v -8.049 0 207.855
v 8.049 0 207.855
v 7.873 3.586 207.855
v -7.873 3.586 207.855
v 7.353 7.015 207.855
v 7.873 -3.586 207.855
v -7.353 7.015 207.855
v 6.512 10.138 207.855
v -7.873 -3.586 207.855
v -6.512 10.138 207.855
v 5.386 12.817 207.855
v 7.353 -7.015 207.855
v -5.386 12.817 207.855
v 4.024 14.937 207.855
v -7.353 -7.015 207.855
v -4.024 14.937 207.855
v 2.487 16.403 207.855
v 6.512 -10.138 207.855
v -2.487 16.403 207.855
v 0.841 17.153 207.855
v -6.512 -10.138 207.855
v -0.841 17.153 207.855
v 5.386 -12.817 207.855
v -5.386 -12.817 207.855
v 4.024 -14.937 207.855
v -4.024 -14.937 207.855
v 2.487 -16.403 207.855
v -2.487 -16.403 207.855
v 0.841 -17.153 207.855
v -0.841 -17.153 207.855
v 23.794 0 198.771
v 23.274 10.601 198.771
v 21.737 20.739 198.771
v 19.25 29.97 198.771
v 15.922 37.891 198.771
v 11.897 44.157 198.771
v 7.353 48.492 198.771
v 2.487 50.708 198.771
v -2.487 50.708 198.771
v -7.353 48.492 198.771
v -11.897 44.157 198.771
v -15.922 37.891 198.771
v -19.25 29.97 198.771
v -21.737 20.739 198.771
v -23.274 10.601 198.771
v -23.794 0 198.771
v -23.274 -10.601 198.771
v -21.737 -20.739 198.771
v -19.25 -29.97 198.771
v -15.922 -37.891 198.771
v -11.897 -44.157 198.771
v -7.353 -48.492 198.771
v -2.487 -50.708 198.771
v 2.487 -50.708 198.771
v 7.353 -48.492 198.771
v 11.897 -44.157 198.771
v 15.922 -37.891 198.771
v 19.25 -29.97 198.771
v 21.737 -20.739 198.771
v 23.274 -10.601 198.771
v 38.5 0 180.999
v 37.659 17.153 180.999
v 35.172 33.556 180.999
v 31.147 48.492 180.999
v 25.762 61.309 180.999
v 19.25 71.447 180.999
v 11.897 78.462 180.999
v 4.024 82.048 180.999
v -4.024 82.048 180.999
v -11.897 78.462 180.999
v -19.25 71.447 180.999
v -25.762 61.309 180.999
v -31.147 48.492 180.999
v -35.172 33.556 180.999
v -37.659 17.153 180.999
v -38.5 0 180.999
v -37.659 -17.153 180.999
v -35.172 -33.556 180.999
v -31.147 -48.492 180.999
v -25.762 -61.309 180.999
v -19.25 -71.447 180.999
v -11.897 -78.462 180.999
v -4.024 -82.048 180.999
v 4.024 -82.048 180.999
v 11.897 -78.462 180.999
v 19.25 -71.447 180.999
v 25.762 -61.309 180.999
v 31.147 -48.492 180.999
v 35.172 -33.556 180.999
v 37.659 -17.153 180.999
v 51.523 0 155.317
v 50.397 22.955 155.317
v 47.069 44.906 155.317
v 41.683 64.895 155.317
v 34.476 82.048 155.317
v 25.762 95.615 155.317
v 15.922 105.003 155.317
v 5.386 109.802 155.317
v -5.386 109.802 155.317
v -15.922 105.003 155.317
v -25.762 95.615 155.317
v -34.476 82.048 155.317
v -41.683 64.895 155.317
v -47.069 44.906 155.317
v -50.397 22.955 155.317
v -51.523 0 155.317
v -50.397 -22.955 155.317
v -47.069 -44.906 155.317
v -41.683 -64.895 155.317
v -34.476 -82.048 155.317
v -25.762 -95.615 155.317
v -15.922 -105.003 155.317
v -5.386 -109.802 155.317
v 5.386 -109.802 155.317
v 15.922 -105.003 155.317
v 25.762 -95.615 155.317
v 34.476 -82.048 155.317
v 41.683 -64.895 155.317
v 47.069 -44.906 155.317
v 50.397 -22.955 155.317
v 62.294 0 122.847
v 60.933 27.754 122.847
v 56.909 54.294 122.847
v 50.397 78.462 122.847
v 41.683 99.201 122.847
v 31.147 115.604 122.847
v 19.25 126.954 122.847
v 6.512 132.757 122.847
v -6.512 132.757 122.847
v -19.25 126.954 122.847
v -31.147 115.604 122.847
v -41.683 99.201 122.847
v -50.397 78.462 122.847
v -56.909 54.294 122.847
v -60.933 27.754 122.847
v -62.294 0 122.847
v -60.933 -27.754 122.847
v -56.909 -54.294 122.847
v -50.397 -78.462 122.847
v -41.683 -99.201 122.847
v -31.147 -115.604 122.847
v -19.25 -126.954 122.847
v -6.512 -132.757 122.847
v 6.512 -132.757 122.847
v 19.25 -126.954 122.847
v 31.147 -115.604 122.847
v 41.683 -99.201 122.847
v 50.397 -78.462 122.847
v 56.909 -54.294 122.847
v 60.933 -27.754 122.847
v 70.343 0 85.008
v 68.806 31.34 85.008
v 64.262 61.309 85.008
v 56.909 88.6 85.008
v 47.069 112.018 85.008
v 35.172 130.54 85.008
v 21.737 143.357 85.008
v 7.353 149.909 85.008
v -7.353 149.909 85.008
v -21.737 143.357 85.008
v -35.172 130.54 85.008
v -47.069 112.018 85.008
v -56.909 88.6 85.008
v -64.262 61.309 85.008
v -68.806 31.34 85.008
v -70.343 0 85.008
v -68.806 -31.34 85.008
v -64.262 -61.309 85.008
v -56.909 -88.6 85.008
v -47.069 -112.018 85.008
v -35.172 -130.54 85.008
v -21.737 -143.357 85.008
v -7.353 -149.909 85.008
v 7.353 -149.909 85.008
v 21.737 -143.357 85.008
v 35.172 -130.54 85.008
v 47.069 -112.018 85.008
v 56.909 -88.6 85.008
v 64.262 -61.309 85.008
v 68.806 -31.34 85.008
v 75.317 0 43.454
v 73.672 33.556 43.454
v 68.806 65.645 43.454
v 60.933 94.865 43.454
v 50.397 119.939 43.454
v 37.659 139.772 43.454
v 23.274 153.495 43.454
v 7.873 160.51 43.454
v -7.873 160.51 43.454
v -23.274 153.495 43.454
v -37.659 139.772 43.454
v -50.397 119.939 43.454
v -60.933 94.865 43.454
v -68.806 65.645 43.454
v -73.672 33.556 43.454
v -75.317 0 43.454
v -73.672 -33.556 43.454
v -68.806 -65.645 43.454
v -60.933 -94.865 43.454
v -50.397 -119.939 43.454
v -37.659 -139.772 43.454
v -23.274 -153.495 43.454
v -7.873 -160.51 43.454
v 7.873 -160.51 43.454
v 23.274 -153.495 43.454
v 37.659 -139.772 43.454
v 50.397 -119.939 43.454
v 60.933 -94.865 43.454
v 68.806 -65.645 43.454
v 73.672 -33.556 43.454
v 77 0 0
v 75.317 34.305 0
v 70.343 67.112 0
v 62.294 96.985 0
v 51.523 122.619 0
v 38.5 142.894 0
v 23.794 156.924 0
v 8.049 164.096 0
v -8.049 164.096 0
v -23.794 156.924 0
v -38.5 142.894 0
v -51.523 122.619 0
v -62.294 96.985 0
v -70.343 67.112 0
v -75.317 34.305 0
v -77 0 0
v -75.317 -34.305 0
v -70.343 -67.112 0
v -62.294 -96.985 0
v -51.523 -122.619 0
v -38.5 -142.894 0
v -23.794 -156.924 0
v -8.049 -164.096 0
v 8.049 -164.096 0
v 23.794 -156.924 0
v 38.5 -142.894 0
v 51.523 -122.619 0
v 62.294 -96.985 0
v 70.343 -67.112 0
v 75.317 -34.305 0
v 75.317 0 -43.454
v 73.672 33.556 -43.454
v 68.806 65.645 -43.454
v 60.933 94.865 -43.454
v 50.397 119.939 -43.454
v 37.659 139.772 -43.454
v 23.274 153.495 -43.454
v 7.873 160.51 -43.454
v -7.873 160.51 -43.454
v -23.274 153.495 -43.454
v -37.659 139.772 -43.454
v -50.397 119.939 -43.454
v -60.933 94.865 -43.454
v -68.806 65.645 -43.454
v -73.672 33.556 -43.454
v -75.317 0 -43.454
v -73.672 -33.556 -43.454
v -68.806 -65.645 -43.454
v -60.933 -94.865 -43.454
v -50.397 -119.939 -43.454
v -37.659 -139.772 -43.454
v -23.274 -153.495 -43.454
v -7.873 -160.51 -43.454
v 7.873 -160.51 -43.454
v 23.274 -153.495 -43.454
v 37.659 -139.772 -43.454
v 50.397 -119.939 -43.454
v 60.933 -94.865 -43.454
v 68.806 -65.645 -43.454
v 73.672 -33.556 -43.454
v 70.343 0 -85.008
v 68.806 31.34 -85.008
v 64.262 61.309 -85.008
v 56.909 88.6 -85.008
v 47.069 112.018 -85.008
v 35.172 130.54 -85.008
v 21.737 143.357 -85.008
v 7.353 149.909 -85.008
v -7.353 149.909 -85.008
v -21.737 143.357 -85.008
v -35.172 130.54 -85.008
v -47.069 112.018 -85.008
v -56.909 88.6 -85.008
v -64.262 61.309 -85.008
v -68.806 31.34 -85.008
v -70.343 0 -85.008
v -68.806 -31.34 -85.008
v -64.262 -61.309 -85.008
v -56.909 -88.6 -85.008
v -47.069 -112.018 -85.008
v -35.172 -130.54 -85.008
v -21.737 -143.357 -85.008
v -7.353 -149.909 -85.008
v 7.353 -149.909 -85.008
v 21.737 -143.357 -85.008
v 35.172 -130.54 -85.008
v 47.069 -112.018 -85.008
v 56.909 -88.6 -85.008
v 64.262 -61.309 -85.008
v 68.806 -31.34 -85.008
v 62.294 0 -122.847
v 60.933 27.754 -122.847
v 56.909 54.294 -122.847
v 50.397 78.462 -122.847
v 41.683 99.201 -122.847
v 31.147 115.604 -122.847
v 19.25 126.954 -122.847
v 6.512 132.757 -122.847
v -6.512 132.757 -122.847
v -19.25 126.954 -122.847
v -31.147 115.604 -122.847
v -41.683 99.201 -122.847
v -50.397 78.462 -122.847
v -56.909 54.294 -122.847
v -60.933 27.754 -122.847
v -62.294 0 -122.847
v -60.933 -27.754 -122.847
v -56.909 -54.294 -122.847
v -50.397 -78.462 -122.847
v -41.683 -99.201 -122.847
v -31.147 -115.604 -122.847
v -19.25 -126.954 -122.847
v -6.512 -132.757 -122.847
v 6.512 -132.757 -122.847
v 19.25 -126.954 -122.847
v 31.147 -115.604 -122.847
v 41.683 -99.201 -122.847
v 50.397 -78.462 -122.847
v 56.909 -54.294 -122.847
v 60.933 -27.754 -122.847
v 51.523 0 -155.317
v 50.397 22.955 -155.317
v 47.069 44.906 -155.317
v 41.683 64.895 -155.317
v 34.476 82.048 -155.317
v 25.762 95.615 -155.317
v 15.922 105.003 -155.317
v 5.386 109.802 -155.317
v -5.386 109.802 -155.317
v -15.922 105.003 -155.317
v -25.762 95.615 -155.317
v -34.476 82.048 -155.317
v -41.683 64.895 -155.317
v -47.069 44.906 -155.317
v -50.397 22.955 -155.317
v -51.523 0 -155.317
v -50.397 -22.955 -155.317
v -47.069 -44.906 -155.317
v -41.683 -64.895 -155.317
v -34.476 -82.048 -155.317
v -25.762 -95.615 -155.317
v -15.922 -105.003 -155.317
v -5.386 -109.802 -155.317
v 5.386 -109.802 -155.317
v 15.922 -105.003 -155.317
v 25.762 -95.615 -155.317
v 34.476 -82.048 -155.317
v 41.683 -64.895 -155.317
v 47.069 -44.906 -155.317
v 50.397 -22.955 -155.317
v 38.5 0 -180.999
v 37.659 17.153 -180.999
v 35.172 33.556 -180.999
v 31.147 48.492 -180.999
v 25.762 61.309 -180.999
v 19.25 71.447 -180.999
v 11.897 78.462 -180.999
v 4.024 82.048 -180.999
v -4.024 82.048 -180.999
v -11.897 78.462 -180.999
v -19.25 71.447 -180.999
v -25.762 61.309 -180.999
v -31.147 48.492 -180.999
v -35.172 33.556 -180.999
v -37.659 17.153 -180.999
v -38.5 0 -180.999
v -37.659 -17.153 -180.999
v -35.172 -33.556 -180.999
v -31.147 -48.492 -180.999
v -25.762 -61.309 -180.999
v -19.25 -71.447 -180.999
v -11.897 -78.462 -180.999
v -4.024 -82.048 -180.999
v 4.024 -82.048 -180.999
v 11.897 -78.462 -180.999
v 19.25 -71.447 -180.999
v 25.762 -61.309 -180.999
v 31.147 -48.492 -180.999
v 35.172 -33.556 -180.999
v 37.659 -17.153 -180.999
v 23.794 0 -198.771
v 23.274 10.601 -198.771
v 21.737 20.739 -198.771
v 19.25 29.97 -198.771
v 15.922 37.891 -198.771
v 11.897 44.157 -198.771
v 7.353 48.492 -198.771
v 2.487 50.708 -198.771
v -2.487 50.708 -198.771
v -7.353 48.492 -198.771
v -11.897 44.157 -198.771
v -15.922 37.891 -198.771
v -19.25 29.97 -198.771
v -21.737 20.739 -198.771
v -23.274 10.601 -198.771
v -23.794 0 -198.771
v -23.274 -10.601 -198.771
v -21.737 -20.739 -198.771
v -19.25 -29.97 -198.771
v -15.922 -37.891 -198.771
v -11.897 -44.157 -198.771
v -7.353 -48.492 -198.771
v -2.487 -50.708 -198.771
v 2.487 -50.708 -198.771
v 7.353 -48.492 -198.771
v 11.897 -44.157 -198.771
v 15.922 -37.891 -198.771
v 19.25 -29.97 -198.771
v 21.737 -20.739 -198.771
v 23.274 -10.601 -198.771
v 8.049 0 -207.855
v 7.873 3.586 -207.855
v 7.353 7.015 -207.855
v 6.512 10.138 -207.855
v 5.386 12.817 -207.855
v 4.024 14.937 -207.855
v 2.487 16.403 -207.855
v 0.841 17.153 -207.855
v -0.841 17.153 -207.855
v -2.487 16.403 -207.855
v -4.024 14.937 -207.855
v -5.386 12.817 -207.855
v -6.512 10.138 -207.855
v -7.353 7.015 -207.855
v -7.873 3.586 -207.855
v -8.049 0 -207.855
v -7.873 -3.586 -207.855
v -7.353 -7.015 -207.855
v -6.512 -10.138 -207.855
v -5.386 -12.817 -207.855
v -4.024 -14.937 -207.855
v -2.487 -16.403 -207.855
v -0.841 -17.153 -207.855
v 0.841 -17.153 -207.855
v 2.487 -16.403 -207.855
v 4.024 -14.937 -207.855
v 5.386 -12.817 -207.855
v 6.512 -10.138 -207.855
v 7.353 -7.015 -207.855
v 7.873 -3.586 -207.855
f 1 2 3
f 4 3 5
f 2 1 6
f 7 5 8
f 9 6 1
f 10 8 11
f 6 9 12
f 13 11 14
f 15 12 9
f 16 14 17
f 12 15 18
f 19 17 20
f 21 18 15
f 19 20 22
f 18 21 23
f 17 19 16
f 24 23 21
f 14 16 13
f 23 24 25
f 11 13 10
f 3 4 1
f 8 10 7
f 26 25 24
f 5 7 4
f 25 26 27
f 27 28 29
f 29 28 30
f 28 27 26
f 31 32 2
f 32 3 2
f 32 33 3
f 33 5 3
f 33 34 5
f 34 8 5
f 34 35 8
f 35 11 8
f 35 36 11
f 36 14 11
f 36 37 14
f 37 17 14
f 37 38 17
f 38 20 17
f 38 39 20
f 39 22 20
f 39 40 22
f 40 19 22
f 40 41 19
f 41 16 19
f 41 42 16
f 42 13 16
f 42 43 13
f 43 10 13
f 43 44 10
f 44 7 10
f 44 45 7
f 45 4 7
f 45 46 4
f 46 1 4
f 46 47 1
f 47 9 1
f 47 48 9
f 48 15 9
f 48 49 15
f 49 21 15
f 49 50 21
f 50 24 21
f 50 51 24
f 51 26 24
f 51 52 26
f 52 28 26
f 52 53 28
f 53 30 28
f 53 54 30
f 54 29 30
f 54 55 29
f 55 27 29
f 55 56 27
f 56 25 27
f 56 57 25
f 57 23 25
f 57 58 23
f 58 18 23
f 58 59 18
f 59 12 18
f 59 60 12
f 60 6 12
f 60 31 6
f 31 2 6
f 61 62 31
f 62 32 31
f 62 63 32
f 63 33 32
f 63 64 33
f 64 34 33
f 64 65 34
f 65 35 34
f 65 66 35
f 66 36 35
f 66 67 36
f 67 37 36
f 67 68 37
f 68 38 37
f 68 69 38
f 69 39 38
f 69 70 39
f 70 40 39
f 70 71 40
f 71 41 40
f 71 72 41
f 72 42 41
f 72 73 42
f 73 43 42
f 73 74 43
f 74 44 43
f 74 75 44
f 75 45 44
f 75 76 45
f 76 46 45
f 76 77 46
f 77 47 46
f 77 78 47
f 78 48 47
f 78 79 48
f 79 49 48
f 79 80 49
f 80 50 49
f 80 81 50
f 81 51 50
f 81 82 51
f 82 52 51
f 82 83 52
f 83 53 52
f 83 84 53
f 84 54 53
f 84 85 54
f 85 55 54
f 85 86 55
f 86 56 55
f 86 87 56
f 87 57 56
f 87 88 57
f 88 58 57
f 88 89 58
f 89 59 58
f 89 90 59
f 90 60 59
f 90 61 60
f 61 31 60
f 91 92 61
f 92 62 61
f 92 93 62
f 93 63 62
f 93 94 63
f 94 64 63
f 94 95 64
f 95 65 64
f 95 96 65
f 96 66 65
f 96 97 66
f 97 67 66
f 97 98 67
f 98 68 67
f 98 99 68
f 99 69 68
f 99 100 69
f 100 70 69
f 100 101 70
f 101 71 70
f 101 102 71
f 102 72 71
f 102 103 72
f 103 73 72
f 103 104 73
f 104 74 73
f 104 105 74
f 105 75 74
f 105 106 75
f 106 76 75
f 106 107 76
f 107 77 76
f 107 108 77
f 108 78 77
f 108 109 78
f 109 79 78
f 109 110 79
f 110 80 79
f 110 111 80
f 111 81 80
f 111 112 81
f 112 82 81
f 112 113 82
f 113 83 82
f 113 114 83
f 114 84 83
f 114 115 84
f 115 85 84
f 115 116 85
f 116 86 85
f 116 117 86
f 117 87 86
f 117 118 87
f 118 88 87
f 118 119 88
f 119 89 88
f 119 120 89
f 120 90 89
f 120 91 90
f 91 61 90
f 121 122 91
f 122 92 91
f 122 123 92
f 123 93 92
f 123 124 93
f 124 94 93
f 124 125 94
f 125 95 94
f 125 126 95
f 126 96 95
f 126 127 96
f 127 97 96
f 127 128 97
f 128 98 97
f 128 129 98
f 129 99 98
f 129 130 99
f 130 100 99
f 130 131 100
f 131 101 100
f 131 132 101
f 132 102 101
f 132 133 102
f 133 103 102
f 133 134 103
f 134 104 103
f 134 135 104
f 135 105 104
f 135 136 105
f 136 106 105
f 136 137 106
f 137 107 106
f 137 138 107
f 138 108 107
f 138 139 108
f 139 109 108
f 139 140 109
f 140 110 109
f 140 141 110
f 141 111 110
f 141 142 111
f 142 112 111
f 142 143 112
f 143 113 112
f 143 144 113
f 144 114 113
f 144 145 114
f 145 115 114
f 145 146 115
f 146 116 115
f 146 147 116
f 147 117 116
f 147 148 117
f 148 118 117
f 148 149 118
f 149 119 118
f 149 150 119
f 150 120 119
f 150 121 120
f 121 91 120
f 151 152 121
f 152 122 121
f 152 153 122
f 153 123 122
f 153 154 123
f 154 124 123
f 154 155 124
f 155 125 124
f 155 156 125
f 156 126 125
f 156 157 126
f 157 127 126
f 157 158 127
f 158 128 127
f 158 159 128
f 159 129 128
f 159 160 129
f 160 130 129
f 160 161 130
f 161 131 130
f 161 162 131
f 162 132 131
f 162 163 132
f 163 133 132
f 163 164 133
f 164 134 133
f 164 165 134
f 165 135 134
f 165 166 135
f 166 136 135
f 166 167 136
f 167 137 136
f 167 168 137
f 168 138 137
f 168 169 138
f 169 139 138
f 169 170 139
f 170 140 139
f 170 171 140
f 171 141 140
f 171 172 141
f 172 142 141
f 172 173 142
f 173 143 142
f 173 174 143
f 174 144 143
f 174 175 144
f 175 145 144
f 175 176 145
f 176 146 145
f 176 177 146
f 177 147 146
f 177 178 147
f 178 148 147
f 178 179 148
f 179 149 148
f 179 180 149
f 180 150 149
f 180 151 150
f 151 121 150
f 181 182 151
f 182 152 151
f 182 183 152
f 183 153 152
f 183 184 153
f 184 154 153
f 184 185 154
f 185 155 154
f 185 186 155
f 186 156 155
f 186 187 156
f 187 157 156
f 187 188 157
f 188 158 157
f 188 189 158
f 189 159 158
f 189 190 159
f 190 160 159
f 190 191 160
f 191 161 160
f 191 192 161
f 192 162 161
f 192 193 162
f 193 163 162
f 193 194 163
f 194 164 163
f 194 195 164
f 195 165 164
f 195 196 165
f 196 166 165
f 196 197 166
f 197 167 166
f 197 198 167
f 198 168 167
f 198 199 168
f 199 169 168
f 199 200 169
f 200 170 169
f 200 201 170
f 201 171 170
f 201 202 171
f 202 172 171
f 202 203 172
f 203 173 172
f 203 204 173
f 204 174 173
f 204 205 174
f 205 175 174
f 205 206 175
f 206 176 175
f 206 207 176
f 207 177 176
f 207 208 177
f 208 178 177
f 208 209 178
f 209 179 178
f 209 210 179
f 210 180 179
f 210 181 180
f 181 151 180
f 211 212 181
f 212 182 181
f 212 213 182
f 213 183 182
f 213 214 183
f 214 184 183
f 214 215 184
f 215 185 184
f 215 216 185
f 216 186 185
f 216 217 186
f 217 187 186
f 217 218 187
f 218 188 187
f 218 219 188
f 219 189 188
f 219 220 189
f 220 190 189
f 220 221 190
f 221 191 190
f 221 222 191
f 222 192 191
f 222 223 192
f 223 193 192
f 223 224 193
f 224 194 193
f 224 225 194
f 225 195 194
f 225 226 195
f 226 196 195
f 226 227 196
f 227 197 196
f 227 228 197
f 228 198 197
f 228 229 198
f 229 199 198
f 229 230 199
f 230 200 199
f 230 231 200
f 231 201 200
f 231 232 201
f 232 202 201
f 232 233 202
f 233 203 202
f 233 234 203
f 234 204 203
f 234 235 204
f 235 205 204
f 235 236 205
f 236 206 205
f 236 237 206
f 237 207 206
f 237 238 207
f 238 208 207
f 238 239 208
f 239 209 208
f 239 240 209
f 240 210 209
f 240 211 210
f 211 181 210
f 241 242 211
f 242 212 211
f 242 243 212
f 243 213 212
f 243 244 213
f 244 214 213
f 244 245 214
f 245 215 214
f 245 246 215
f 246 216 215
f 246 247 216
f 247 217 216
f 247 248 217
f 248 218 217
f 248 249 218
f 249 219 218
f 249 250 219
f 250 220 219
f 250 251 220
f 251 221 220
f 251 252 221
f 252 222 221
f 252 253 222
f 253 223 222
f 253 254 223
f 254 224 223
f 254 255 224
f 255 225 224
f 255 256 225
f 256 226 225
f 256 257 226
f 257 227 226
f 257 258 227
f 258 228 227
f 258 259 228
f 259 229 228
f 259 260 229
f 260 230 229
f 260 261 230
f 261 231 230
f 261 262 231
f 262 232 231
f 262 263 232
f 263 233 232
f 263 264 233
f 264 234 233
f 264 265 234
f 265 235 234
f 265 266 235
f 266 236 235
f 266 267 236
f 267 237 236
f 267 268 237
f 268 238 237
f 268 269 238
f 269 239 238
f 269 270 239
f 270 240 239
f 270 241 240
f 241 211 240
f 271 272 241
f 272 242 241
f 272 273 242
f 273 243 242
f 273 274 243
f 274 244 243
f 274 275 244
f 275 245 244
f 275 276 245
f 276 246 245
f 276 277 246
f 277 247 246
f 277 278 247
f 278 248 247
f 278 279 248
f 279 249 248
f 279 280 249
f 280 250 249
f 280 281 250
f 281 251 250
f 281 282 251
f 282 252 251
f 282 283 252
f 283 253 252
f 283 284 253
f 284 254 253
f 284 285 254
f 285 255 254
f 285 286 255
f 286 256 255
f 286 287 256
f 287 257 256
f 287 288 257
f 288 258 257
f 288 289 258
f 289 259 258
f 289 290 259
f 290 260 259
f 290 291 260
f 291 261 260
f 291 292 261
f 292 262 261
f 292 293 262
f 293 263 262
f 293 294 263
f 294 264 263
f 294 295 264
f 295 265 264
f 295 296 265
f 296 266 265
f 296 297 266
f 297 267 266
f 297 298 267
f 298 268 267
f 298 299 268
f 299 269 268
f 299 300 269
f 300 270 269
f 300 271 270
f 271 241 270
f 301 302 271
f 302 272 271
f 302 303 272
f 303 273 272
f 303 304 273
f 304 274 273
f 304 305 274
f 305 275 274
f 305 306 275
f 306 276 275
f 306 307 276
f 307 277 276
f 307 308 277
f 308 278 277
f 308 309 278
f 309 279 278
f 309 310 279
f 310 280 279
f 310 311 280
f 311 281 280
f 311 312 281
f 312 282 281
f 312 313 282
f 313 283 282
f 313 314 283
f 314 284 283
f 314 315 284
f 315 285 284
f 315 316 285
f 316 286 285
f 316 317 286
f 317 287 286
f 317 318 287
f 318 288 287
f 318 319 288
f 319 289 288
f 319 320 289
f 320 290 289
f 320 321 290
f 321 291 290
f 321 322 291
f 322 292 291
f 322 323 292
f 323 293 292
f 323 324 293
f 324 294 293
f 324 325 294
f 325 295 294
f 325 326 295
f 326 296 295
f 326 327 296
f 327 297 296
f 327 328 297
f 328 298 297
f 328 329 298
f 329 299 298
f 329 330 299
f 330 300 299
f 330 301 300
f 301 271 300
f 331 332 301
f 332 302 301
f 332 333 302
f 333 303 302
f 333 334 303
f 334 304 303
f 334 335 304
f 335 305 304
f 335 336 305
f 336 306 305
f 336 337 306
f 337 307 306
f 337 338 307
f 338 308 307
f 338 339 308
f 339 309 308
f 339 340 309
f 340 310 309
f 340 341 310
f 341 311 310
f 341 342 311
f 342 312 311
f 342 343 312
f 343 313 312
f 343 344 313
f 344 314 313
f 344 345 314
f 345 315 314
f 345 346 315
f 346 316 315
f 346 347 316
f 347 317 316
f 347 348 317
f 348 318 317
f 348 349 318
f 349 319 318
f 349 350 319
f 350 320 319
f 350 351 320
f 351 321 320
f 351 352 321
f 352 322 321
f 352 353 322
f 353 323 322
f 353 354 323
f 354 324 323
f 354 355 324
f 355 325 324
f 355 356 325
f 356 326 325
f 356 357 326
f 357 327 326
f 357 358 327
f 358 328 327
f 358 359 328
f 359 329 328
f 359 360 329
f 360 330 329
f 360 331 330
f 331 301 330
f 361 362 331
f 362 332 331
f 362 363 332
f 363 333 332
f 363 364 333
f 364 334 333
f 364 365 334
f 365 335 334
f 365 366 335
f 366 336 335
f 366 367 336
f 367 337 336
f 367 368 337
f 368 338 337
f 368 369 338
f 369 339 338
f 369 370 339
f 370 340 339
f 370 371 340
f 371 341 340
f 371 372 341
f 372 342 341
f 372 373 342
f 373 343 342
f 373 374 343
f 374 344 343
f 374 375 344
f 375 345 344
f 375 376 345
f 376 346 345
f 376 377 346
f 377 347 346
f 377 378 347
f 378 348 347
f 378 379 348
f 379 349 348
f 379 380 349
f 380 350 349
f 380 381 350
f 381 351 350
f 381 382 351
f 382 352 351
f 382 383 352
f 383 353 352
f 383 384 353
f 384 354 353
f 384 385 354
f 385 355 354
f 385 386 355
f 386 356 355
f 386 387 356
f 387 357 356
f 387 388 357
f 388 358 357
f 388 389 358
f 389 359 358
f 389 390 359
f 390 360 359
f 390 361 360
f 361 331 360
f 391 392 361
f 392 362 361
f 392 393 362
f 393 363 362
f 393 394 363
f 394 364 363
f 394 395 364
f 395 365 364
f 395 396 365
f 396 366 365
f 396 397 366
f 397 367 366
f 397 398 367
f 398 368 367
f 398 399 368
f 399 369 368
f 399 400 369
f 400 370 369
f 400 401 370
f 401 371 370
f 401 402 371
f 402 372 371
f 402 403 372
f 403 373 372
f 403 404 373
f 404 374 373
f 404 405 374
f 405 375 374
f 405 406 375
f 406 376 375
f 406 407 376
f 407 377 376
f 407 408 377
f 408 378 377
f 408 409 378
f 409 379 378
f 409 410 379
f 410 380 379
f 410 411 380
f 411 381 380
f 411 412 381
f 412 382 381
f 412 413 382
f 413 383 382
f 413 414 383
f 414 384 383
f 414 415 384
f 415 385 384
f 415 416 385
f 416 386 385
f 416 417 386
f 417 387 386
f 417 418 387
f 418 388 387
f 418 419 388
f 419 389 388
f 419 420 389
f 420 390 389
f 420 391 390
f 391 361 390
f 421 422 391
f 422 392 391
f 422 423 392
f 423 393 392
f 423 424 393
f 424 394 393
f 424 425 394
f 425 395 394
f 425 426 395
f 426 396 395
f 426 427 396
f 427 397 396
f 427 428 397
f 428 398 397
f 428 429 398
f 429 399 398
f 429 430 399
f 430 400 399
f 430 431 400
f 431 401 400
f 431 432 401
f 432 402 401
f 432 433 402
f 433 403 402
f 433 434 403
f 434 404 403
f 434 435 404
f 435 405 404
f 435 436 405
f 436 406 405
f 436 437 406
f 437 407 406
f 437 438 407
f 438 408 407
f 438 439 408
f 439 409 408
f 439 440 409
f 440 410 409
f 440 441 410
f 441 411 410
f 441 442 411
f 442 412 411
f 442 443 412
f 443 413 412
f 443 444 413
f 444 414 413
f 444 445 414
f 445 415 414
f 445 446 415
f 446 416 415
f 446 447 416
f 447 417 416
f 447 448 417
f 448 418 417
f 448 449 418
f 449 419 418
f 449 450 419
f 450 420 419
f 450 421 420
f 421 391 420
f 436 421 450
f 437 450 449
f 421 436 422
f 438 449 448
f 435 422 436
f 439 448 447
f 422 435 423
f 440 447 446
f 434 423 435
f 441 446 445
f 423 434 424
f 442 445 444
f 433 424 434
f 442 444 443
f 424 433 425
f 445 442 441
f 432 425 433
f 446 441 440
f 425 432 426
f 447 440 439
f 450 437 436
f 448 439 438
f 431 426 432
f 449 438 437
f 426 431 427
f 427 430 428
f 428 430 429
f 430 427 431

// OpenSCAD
// Generated by SolidPython 1.0.1 on 2020-07-29 00:46:48


scale(v = [7, 15, 19]) {
	sphere(r = 11);
}
/***********************************************
*********      SolidPython code:      **********
************************************************
 
# import packages: SolidPython
from solid import *
from solid.utils import *
from itertools import chain, combinations, permutations


class Resize:

    def __init__(self, scad_file):
        self.scad_file = scad_file
        #self.scad_file = import_scad(scad_file)
        # cone/cylinder param:
        self.r1 = 0
        self.r2 = 0
        self.h = 0
        # rectangular prism param:
        self.w = 0
        self.l = 0
        # ellipse param:
        self.r = 0

    # import OpenScad code (file name corresponds to shape)


    # classify shape + parameters
    def assign(self, param1, param2, param3):
        if self.scad_file == 'cone.scad':
            self.r1 = param1
            self.r2 = param2
            self.h = param3
        elif self.scad_file == 'cylinder.scad':
            self.r1 = param1
            self.r2 = param2
            self.h = param3
        elif self.scad_file == 'rectangularPrism.scad':
            self.h = param1
            self.l = param2
            self.w = param3
        else:
            self.r = param1
            self.h = param2

    # resize parameters
    def iterate(self):
        x = range(3, 20, 2)
        i = 1
        if self.scad_file == 'cone.scad':
            tempList = list(permutations(x, 2))
            for temp in tempList:
                param1 = temp[0]
                param2 = temp[1]
                filepath = 'produced_scad_files/' + 'cone' + str(param1) + '_' + str(param2) + '_' + '.scad'
                scad_render_to_file(cylinder(h=param1, r1=param2, r2=0), filepath)

        elif self.scad_file == 'cylinder.scad':
            tempList = list(permutations(x, 3))
            for temp in tempList:
                param1 = temp[0]
                param2 = temp[1]
                filepath = 'produced_scad_files/' + 'cylinder' + str(param1) + '_' + str(param2) + '_' + '.scad'
                scad_render_to_file(cylinder(h=param1, r1=param2, r2=param2), filepath)

        elif self.scad_file == 'rectangularPrism.scad':
            tempList = list(permutations(x, 3))
            for temp in tempList:
                param1 = temp[0]
                param2 = temp[1]
                param3 = temp[2]
                filepath = 'produced_scad_files/' + 'rectangularPrism' + str(param1) + '_' + str(param2) + '_' + str(
                    param3) + '.scad'
                scad_render_to_file(cube(size=(param1, param2, param3)), filepath)

        elif self.scad_file == 'ellipse.scad':
            tempList = list(permutations(x, 4))
            for temp in tempList:
                param1 = temp[0]
                param2 = temp[1]
                param3 = temp[2]
                param4 = temp[3]
                filepath = 'produced_scad_files/' + 'ellipse' + str(param1) + '_' + str(param2) + '_' + str(param3) + '_' + str(param4) + '.scad'
                scad_render_to_file(scale([param1, param2, param3])(sphere(r=param4)), filepath)

    def render_to_scadfile(self):
        scad_render_to_file(scad, 'example.scad') 
 
************************************************/
